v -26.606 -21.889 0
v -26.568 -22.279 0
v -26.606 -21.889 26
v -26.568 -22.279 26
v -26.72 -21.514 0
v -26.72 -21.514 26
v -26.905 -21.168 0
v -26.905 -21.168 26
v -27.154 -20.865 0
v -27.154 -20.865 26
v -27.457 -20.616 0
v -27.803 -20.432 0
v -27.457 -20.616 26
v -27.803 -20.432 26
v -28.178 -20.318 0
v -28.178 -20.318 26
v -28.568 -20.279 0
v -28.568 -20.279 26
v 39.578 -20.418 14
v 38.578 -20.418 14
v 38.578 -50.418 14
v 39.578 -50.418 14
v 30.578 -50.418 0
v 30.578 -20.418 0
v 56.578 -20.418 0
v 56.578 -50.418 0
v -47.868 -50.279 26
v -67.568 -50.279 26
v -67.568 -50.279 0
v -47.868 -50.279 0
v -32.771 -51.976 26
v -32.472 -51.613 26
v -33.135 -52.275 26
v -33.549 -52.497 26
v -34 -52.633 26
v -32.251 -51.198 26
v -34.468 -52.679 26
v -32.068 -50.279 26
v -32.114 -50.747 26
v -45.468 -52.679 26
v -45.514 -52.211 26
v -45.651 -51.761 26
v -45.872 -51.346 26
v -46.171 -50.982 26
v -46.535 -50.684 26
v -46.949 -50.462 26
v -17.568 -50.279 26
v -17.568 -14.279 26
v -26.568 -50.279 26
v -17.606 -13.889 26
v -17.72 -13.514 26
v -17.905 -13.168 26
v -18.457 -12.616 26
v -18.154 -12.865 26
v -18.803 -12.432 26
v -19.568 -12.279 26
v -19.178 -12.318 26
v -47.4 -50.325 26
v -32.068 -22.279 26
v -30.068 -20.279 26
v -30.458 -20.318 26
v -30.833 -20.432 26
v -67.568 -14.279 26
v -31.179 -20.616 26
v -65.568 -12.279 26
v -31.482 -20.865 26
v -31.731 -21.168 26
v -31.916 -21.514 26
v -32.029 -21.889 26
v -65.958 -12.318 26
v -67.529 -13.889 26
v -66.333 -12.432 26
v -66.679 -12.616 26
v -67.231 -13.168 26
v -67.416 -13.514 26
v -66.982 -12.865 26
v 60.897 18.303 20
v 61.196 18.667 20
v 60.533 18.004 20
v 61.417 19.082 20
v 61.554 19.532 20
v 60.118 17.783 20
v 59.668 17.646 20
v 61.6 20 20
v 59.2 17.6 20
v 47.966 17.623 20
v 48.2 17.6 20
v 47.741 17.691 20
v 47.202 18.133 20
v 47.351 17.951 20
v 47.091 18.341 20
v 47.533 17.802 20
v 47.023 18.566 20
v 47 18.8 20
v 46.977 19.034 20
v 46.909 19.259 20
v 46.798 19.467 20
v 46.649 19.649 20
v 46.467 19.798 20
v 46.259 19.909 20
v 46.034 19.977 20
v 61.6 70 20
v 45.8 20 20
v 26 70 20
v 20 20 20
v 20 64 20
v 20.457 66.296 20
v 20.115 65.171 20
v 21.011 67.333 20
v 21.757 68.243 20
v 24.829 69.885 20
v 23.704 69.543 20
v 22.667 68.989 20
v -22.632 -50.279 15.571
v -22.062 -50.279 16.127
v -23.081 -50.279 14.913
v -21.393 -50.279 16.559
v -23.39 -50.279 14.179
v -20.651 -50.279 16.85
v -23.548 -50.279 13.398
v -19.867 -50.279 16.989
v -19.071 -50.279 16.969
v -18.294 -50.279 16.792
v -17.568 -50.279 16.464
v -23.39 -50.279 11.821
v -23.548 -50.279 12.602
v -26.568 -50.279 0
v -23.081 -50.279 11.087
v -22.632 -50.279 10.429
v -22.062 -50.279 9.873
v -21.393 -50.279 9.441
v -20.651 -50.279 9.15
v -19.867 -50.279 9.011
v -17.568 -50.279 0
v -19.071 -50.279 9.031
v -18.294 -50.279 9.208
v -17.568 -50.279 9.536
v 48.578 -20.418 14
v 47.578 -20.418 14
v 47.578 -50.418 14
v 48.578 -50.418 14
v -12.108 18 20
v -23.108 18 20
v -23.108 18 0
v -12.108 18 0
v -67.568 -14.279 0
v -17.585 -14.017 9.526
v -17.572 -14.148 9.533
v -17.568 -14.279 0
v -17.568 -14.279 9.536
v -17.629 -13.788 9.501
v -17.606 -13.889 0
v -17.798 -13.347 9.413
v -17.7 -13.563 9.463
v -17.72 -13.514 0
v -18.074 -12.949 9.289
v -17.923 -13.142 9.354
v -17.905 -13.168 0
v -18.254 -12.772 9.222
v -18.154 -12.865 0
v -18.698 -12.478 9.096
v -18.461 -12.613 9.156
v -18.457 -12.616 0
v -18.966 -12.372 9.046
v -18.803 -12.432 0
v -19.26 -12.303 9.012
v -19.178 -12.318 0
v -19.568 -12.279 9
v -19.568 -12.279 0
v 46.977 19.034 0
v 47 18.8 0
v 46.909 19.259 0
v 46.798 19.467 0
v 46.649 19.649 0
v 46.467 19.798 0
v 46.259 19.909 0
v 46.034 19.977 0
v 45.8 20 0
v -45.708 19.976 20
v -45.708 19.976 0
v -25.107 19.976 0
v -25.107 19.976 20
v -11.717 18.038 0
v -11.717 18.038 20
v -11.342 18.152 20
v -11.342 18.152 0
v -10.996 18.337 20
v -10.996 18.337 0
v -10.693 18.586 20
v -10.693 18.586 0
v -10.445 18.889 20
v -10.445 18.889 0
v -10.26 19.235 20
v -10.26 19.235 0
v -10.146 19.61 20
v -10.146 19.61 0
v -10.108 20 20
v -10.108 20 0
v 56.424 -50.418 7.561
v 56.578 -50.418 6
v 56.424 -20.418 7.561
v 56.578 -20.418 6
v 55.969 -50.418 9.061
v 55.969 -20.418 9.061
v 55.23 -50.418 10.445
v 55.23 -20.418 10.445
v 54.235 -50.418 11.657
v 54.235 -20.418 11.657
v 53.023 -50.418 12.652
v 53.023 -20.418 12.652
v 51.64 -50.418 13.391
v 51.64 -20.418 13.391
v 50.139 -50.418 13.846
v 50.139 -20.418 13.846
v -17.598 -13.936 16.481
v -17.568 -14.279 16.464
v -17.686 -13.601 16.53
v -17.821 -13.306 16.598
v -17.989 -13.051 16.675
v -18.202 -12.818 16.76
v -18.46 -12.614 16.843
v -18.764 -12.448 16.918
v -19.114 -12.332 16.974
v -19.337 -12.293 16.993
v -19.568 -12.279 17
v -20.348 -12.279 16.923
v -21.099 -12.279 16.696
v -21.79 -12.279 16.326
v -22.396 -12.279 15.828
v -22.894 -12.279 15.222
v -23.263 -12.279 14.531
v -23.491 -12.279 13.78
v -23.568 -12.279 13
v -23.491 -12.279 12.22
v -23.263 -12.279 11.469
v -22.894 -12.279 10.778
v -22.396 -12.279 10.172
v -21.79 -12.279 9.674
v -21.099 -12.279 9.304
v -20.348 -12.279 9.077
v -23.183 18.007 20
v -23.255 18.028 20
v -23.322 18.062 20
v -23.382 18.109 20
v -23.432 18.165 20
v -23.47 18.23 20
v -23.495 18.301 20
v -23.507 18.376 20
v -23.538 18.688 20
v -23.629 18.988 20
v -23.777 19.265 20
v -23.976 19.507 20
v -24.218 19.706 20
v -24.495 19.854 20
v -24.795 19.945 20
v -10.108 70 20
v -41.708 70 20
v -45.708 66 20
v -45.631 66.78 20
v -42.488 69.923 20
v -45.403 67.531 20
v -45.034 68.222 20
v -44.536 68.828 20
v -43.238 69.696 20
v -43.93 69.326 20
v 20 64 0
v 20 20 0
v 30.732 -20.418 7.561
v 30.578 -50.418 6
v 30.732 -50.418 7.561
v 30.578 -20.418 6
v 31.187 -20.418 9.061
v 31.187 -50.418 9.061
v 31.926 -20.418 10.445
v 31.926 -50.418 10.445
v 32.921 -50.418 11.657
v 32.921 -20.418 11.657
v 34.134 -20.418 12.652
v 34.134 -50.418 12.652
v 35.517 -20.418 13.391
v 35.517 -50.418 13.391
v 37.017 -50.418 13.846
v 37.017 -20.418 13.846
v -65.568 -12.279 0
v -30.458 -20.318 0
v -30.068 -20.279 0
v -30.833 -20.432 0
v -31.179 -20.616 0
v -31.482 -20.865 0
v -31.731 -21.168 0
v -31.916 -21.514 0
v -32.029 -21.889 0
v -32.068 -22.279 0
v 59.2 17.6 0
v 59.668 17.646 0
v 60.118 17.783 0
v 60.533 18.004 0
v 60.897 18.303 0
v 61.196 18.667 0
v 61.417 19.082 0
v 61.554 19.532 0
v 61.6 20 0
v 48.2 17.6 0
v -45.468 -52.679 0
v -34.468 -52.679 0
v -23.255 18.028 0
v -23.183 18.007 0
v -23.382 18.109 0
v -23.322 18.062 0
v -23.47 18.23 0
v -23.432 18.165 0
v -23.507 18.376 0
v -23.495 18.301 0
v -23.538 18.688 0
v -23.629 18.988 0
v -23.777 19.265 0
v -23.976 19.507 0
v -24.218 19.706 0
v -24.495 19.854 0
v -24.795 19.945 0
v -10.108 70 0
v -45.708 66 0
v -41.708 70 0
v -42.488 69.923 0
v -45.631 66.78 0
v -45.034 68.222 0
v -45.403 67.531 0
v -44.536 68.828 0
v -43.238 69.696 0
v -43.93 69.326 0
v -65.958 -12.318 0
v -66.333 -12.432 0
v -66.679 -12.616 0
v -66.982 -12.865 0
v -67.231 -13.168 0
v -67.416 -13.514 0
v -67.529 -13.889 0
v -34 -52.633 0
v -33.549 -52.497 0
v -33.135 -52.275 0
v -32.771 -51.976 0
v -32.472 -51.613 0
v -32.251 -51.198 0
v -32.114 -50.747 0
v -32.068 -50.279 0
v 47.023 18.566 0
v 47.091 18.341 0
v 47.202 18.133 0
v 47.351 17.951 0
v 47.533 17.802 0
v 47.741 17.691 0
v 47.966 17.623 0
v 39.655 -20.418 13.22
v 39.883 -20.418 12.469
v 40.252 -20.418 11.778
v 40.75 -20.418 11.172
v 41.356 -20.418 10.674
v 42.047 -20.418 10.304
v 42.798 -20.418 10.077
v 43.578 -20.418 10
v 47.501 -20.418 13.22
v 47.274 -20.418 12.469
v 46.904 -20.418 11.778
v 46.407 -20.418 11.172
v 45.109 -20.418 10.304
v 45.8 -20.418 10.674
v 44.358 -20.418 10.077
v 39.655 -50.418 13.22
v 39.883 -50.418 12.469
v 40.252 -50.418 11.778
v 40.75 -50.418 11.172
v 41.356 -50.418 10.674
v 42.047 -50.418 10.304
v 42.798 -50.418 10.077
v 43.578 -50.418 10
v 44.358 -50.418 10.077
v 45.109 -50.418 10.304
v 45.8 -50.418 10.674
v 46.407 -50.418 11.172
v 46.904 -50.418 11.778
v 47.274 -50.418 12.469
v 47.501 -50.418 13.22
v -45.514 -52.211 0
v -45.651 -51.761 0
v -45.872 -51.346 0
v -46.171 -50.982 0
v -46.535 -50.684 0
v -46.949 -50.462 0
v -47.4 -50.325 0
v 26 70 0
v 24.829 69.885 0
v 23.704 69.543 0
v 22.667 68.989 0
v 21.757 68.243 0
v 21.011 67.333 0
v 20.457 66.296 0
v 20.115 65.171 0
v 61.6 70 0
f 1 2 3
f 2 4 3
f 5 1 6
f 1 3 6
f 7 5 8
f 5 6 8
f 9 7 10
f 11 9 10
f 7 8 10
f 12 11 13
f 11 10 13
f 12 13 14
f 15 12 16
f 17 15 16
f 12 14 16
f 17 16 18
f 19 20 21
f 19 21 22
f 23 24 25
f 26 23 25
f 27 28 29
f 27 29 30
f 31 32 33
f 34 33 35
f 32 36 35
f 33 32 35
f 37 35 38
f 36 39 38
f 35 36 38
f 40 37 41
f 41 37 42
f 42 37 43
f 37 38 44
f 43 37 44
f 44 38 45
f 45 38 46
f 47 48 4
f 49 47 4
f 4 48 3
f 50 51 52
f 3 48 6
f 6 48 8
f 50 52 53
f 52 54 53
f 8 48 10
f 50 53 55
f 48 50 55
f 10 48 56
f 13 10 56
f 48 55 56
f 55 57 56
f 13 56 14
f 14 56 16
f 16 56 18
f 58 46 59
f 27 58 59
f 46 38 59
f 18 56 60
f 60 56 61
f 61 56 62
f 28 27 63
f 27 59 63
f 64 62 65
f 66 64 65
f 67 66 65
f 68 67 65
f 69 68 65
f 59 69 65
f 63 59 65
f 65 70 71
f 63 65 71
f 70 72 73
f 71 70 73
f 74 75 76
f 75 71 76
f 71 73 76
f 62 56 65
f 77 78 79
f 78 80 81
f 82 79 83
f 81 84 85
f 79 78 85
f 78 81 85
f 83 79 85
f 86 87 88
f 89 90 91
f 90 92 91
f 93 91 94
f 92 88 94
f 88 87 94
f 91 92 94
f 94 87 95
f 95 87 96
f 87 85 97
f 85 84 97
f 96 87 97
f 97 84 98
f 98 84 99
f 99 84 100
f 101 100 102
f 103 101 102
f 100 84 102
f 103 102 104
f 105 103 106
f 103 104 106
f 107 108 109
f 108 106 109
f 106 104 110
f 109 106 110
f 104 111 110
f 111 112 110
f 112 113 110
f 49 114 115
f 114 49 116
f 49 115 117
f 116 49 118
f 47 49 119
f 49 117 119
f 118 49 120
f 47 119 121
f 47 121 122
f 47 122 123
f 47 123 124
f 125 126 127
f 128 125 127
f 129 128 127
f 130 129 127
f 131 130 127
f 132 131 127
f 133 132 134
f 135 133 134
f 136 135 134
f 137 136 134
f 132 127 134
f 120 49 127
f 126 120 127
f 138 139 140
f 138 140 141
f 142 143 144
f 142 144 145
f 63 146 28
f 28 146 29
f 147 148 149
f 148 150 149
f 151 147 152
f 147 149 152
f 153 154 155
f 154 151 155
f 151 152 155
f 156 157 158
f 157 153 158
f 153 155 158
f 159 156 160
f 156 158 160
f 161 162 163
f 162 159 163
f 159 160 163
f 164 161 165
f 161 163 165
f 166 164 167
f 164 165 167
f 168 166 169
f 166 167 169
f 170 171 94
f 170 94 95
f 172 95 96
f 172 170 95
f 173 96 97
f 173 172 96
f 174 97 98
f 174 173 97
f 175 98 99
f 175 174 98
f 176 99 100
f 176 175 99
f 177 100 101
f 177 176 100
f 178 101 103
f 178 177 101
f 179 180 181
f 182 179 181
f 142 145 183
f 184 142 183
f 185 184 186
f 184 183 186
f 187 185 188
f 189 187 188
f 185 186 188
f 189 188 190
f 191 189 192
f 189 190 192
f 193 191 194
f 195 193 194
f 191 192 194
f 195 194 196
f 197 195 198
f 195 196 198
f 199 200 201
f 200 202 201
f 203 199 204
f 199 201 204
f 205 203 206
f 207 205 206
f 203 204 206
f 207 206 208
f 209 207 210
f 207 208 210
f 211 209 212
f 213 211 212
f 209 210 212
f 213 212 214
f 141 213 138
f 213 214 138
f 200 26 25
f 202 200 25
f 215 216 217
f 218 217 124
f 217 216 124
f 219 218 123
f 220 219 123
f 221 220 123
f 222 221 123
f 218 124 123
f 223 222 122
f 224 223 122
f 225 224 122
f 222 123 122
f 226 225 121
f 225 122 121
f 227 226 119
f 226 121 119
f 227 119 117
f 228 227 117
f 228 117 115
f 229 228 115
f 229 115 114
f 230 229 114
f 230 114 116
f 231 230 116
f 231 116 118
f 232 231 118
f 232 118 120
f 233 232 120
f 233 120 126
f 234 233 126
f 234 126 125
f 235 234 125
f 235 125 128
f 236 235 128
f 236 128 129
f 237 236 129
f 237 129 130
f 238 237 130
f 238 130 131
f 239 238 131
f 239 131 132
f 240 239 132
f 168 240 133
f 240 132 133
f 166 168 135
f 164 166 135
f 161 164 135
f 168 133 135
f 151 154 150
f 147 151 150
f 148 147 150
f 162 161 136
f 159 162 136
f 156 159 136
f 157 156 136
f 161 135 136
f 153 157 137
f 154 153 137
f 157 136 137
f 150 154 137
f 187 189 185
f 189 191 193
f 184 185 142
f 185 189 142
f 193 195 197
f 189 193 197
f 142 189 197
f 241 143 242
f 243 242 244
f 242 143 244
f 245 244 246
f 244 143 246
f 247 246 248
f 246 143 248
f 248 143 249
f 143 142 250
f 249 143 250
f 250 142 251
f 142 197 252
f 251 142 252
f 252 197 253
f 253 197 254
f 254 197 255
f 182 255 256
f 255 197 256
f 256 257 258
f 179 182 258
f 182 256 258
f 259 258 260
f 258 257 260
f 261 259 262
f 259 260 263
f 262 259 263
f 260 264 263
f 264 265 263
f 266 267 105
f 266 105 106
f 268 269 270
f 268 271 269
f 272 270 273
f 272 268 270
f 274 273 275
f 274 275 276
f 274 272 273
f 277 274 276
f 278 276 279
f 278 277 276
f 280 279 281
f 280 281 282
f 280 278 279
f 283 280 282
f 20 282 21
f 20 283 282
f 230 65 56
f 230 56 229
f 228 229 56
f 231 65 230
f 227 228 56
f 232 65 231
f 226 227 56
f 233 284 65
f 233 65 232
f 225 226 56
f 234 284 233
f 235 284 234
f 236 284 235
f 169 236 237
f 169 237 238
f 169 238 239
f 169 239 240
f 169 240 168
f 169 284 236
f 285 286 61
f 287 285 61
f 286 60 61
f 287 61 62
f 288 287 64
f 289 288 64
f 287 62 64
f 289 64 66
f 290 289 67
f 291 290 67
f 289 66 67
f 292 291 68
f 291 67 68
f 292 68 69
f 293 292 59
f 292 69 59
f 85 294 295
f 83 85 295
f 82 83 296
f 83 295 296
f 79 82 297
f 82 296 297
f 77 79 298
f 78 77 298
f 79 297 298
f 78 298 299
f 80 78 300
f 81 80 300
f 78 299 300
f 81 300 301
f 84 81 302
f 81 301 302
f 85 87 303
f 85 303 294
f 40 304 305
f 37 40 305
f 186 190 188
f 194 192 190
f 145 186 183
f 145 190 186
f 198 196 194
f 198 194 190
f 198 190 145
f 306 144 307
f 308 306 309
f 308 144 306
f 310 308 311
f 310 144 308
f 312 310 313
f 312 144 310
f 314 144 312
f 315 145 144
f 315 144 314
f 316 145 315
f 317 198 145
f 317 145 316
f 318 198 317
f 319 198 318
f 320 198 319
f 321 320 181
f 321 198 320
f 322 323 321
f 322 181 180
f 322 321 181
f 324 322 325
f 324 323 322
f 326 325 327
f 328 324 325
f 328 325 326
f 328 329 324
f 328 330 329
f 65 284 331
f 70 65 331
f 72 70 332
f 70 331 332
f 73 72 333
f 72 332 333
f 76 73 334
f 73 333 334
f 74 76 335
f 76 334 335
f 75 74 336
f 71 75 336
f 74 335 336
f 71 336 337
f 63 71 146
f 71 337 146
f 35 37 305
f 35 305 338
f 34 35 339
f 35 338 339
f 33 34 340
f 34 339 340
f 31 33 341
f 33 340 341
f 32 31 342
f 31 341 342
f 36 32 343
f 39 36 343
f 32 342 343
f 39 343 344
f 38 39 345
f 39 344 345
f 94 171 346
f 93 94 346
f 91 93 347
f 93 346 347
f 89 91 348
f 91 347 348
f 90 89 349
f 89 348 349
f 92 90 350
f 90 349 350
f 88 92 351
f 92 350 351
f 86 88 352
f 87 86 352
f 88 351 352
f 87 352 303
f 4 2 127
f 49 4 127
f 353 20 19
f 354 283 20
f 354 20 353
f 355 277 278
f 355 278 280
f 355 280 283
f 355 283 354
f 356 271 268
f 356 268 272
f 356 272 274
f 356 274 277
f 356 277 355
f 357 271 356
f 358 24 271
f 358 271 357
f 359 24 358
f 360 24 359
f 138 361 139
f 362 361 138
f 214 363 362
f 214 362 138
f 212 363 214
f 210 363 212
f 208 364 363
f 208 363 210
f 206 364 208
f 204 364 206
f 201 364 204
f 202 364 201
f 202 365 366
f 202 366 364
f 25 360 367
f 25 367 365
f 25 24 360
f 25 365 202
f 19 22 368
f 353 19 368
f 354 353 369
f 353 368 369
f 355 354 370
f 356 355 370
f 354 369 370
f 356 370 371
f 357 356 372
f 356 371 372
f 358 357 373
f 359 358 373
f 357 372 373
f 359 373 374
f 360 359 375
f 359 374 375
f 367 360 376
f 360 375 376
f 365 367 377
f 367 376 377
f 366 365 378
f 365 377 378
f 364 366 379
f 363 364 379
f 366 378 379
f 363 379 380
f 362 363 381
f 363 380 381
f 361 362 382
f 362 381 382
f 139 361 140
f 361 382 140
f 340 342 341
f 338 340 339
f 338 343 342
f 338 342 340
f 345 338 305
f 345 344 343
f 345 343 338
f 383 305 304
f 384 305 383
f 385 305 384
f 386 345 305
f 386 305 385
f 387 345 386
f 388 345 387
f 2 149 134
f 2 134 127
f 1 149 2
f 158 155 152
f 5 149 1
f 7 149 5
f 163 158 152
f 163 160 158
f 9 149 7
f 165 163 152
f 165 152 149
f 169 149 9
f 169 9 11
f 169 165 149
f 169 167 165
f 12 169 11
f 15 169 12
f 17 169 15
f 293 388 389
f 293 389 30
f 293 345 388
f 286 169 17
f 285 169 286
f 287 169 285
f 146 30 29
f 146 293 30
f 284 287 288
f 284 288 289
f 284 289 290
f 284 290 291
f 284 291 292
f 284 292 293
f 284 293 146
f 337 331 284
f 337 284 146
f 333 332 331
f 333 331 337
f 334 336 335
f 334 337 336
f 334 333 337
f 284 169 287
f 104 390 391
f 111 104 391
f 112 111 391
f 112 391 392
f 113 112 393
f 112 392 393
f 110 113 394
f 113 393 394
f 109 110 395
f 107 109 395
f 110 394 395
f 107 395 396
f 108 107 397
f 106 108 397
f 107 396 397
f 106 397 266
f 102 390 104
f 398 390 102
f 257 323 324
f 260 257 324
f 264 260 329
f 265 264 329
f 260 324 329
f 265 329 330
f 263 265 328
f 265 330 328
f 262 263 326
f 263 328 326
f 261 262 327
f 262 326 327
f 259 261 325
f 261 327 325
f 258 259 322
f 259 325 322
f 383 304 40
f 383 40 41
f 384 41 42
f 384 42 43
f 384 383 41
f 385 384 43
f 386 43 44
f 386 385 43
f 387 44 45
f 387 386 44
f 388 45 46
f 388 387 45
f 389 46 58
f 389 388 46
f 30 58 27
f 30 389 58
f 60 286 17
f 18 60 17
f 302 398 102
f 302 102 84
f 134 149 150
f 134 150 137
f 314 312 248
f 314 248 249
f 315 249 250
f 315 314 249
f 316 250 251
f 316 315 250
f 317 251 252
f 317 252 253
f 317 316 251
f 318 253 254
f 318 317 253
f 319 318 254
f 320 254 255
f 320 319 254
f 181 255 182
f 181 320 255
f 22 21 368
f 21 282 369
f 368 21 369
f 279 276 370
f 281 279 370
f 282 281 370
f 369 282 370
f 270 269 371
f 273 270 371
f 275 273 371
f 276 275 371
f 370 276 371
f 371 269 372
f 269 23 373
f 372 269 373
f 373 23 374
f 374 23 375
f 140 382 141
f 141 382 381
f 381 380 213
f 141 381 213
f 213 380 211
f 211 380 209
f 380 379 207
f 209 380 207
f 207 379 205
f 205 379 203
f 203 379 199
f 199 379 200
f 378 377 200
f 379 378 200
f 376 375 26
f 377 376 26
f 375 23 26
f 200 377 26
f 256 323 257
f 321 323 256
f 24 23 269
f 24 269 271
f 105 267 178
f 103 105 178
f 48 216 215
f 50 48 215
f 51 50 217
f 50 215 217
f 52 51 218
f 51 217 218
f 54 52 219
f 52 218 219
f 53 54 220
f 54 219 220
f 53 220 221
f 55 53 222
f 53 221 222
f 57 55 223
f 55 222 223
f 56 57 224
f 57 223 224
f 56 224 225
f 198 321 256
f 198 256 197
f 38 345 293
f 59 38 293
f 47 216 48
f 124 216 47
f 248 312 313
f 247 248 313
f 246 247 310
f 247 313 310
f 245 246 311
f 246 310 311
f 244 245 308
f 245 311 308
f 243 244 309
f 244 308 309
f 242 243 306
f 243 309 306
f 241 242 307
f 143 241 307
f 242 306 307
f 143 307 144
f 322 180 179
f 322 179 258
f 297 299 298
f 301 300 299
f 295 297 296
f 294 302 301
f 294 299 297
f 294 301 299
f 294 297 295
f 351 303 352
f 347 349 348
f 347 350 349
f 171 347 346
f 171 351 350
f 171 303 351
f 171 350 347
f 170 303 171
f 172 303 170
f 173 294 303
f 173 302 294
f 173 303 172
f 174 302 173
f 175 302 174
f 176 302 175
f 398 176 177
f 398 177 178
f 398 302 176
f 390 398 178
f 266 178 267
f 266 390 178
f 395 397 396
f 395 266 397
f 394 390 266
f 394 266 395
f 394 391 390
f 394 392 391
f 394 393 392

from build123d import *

# Parameters (mm, degrees)
PAD_DEPTH       = 20
PAD001_DEPTH    = 20
PAD002_DEPTH    = 26
SKETCH003_R     = 4
POCKET_DEPTH    = 38
FILLET_R        = 2
SKETCH004_W     = 26
SKETCH004_H     = 30
PAD003_DEPTH    = 14
SKETCH005_R     = 4
POCKET001_DEPTH = 30
FILLET001_R     = 8


with BuildPart() as body:
    # Sketch → Pad (new body)
    with BuildSketch(Plane.XY):
        with BuildLine():
            Line((26, 70), (61.6, 70))
            Line((61.6, 70), (61.6, 20))
            ThreePointArc((59.2, 17.6), (60.897056, 18.302944), (61.6, 20))
            Line((48.2, 17.6), (59.2, 17.6))
            ThreePointArc((47, 18.8), (47.351472, 17.951472), (48.2, 17.6))
            ThreePointArc((47, 18.8), (46.648528, 19.648528), (45.8, 20))
            Line((20, 20), (45.8, 20))
            Line((20, 20), (20, 64))
            ThreePointArc((26, 70), (21.757359, 68.242641), (20, 64))
        make_face()
    extrude(amount=PAD_DEPTH)


with BuildPart() as body001:
    # Sketch001 → Pad001 (new body)
    with BuildSketch(Plane.XY):
        with BuildLine():
            Line((-41.707622, 70), (-10.107622, 70))
            Line((-10.107622, 70), (-10.107622, 20))
            ThreePointArc((-12.107604, 18), (-10.693402, 18.585793), (-10.107622, 20))
            Line((-23.107604, 18), (-12.107604, 18))
            ThreePointArc((-23.506873, 18.375817), (-23.381764, 18.108733), (-23.107604, 18))
            ThreePointArc((-23.506873, 18.375817), (-23.975502, 19.507188), (-25.106873, 19.975817))
            Line((-45.707622, 19.975817), (-25.106873, 19.975817))
            Line((-45.707622, 19.975817), (-45.707622, 66))
            ThreePointArc((-41.707622, 70), (-44.536049, 68.828427), (-45.707622, 66))
        make_face()
    extrude(amount=PAD001_DEPTH)


with BuildPart() as body002:
    # Sketch002 → Pad002 (new body)
    with BuildSketch(Plane.XY):
        with BuildLine():
            Line((-65.567929, -12.279267), (-19.567929, -12.279267))
            ThreePointArc((-17.567929, -14.279267), (-18.153716, -12.865054), (-19.567929, -12.279267))
            Line((-17.567929, -14.279267), (-17.567929, -50.279267))
            Line((-26.567929, -50.279267), (-17.567929, -50.279267))
            Line((-26.567929, -20.279267), (-26.567929, -50.279267))
            Line((-32.067929, -20.279267), (-26.567929, -20.279267))
            Line((-32.067929, -50.279267), (-32.067929, -20.279267))
            ThreePointArc((-34.467929, -52.679267), (-32.770873, -51.976324), (-32.067929, -50.279267))
            Line((-45.467929, -52.679267), (-34.467929, -52.679267))
            ThreePointArc((-45.467929, -52.679267), (-46.170873, -50.982211), (-47.867929, -50.279267))
            Line((-67.567929, -50.279267), (-47.867929, -50.279267))
            Line((-67.567929, -14.279267), (-67.567929, -50.279267))
            ThreePointArc((-65.567929, -12.279267), (-66.982143, -12.865054), (-67.567929, -14.279267))
        make_face()
    extrude(amount=PAD002_DEPTH)

    # Sketch003 (on Face5 of Pad002) → Pocket (cut)
    with BuildSketch(Plane.XZ.offset(50.279267)):
        with Locations((-19.567929, 13)):
            Circle(SKETCH003_R)
    extrude(amount=-POCKET_DEPTH, mode=Mode.SUBTRACT)

    # Fillet
    fillet_edges = [body002.edges().sort_by_distance(p)[0] for p in [
        (-32.067929, -20.279267, 13),
        (-26.567929, -20.279267, 13),
    ]]
    fillet(fillet_edges, radius=FILLET_R)


with BuildPart() as body003:
    # Sketch004 → Pad003 (new body)
    with BuildSketch(Plane.XY):
        with Locations((43.578081, -35.417926)):
            Rectangle(SKETCH004_W, SKETCH004_H)
    extrude(amount=PAD003_DEPTH)

    # Sketch005 (on Face2 of Pad003) → Pocket001 (cut)
    with BuildSketch(Plane.XZ.offset(50.417926)):
        with Locations((43.578081, 14)):
            Circle(SKETCH005_R)
    extrude(amount=-POCKET001_DEPTH, mode=Mode.SUBTRACT)

    # Fillet001
    fillet001_edges = [body003.edges().sort_by_distance(p)[0] for p in [
        (56.578081, -35.417926, 14),
        (30.578081, -35.417926, 14),
    ]]
    fillet(fillet001_edges, radius=FILLET001_R)


solid = Compound([body.part, body001.part, body002.part, body003.part])
